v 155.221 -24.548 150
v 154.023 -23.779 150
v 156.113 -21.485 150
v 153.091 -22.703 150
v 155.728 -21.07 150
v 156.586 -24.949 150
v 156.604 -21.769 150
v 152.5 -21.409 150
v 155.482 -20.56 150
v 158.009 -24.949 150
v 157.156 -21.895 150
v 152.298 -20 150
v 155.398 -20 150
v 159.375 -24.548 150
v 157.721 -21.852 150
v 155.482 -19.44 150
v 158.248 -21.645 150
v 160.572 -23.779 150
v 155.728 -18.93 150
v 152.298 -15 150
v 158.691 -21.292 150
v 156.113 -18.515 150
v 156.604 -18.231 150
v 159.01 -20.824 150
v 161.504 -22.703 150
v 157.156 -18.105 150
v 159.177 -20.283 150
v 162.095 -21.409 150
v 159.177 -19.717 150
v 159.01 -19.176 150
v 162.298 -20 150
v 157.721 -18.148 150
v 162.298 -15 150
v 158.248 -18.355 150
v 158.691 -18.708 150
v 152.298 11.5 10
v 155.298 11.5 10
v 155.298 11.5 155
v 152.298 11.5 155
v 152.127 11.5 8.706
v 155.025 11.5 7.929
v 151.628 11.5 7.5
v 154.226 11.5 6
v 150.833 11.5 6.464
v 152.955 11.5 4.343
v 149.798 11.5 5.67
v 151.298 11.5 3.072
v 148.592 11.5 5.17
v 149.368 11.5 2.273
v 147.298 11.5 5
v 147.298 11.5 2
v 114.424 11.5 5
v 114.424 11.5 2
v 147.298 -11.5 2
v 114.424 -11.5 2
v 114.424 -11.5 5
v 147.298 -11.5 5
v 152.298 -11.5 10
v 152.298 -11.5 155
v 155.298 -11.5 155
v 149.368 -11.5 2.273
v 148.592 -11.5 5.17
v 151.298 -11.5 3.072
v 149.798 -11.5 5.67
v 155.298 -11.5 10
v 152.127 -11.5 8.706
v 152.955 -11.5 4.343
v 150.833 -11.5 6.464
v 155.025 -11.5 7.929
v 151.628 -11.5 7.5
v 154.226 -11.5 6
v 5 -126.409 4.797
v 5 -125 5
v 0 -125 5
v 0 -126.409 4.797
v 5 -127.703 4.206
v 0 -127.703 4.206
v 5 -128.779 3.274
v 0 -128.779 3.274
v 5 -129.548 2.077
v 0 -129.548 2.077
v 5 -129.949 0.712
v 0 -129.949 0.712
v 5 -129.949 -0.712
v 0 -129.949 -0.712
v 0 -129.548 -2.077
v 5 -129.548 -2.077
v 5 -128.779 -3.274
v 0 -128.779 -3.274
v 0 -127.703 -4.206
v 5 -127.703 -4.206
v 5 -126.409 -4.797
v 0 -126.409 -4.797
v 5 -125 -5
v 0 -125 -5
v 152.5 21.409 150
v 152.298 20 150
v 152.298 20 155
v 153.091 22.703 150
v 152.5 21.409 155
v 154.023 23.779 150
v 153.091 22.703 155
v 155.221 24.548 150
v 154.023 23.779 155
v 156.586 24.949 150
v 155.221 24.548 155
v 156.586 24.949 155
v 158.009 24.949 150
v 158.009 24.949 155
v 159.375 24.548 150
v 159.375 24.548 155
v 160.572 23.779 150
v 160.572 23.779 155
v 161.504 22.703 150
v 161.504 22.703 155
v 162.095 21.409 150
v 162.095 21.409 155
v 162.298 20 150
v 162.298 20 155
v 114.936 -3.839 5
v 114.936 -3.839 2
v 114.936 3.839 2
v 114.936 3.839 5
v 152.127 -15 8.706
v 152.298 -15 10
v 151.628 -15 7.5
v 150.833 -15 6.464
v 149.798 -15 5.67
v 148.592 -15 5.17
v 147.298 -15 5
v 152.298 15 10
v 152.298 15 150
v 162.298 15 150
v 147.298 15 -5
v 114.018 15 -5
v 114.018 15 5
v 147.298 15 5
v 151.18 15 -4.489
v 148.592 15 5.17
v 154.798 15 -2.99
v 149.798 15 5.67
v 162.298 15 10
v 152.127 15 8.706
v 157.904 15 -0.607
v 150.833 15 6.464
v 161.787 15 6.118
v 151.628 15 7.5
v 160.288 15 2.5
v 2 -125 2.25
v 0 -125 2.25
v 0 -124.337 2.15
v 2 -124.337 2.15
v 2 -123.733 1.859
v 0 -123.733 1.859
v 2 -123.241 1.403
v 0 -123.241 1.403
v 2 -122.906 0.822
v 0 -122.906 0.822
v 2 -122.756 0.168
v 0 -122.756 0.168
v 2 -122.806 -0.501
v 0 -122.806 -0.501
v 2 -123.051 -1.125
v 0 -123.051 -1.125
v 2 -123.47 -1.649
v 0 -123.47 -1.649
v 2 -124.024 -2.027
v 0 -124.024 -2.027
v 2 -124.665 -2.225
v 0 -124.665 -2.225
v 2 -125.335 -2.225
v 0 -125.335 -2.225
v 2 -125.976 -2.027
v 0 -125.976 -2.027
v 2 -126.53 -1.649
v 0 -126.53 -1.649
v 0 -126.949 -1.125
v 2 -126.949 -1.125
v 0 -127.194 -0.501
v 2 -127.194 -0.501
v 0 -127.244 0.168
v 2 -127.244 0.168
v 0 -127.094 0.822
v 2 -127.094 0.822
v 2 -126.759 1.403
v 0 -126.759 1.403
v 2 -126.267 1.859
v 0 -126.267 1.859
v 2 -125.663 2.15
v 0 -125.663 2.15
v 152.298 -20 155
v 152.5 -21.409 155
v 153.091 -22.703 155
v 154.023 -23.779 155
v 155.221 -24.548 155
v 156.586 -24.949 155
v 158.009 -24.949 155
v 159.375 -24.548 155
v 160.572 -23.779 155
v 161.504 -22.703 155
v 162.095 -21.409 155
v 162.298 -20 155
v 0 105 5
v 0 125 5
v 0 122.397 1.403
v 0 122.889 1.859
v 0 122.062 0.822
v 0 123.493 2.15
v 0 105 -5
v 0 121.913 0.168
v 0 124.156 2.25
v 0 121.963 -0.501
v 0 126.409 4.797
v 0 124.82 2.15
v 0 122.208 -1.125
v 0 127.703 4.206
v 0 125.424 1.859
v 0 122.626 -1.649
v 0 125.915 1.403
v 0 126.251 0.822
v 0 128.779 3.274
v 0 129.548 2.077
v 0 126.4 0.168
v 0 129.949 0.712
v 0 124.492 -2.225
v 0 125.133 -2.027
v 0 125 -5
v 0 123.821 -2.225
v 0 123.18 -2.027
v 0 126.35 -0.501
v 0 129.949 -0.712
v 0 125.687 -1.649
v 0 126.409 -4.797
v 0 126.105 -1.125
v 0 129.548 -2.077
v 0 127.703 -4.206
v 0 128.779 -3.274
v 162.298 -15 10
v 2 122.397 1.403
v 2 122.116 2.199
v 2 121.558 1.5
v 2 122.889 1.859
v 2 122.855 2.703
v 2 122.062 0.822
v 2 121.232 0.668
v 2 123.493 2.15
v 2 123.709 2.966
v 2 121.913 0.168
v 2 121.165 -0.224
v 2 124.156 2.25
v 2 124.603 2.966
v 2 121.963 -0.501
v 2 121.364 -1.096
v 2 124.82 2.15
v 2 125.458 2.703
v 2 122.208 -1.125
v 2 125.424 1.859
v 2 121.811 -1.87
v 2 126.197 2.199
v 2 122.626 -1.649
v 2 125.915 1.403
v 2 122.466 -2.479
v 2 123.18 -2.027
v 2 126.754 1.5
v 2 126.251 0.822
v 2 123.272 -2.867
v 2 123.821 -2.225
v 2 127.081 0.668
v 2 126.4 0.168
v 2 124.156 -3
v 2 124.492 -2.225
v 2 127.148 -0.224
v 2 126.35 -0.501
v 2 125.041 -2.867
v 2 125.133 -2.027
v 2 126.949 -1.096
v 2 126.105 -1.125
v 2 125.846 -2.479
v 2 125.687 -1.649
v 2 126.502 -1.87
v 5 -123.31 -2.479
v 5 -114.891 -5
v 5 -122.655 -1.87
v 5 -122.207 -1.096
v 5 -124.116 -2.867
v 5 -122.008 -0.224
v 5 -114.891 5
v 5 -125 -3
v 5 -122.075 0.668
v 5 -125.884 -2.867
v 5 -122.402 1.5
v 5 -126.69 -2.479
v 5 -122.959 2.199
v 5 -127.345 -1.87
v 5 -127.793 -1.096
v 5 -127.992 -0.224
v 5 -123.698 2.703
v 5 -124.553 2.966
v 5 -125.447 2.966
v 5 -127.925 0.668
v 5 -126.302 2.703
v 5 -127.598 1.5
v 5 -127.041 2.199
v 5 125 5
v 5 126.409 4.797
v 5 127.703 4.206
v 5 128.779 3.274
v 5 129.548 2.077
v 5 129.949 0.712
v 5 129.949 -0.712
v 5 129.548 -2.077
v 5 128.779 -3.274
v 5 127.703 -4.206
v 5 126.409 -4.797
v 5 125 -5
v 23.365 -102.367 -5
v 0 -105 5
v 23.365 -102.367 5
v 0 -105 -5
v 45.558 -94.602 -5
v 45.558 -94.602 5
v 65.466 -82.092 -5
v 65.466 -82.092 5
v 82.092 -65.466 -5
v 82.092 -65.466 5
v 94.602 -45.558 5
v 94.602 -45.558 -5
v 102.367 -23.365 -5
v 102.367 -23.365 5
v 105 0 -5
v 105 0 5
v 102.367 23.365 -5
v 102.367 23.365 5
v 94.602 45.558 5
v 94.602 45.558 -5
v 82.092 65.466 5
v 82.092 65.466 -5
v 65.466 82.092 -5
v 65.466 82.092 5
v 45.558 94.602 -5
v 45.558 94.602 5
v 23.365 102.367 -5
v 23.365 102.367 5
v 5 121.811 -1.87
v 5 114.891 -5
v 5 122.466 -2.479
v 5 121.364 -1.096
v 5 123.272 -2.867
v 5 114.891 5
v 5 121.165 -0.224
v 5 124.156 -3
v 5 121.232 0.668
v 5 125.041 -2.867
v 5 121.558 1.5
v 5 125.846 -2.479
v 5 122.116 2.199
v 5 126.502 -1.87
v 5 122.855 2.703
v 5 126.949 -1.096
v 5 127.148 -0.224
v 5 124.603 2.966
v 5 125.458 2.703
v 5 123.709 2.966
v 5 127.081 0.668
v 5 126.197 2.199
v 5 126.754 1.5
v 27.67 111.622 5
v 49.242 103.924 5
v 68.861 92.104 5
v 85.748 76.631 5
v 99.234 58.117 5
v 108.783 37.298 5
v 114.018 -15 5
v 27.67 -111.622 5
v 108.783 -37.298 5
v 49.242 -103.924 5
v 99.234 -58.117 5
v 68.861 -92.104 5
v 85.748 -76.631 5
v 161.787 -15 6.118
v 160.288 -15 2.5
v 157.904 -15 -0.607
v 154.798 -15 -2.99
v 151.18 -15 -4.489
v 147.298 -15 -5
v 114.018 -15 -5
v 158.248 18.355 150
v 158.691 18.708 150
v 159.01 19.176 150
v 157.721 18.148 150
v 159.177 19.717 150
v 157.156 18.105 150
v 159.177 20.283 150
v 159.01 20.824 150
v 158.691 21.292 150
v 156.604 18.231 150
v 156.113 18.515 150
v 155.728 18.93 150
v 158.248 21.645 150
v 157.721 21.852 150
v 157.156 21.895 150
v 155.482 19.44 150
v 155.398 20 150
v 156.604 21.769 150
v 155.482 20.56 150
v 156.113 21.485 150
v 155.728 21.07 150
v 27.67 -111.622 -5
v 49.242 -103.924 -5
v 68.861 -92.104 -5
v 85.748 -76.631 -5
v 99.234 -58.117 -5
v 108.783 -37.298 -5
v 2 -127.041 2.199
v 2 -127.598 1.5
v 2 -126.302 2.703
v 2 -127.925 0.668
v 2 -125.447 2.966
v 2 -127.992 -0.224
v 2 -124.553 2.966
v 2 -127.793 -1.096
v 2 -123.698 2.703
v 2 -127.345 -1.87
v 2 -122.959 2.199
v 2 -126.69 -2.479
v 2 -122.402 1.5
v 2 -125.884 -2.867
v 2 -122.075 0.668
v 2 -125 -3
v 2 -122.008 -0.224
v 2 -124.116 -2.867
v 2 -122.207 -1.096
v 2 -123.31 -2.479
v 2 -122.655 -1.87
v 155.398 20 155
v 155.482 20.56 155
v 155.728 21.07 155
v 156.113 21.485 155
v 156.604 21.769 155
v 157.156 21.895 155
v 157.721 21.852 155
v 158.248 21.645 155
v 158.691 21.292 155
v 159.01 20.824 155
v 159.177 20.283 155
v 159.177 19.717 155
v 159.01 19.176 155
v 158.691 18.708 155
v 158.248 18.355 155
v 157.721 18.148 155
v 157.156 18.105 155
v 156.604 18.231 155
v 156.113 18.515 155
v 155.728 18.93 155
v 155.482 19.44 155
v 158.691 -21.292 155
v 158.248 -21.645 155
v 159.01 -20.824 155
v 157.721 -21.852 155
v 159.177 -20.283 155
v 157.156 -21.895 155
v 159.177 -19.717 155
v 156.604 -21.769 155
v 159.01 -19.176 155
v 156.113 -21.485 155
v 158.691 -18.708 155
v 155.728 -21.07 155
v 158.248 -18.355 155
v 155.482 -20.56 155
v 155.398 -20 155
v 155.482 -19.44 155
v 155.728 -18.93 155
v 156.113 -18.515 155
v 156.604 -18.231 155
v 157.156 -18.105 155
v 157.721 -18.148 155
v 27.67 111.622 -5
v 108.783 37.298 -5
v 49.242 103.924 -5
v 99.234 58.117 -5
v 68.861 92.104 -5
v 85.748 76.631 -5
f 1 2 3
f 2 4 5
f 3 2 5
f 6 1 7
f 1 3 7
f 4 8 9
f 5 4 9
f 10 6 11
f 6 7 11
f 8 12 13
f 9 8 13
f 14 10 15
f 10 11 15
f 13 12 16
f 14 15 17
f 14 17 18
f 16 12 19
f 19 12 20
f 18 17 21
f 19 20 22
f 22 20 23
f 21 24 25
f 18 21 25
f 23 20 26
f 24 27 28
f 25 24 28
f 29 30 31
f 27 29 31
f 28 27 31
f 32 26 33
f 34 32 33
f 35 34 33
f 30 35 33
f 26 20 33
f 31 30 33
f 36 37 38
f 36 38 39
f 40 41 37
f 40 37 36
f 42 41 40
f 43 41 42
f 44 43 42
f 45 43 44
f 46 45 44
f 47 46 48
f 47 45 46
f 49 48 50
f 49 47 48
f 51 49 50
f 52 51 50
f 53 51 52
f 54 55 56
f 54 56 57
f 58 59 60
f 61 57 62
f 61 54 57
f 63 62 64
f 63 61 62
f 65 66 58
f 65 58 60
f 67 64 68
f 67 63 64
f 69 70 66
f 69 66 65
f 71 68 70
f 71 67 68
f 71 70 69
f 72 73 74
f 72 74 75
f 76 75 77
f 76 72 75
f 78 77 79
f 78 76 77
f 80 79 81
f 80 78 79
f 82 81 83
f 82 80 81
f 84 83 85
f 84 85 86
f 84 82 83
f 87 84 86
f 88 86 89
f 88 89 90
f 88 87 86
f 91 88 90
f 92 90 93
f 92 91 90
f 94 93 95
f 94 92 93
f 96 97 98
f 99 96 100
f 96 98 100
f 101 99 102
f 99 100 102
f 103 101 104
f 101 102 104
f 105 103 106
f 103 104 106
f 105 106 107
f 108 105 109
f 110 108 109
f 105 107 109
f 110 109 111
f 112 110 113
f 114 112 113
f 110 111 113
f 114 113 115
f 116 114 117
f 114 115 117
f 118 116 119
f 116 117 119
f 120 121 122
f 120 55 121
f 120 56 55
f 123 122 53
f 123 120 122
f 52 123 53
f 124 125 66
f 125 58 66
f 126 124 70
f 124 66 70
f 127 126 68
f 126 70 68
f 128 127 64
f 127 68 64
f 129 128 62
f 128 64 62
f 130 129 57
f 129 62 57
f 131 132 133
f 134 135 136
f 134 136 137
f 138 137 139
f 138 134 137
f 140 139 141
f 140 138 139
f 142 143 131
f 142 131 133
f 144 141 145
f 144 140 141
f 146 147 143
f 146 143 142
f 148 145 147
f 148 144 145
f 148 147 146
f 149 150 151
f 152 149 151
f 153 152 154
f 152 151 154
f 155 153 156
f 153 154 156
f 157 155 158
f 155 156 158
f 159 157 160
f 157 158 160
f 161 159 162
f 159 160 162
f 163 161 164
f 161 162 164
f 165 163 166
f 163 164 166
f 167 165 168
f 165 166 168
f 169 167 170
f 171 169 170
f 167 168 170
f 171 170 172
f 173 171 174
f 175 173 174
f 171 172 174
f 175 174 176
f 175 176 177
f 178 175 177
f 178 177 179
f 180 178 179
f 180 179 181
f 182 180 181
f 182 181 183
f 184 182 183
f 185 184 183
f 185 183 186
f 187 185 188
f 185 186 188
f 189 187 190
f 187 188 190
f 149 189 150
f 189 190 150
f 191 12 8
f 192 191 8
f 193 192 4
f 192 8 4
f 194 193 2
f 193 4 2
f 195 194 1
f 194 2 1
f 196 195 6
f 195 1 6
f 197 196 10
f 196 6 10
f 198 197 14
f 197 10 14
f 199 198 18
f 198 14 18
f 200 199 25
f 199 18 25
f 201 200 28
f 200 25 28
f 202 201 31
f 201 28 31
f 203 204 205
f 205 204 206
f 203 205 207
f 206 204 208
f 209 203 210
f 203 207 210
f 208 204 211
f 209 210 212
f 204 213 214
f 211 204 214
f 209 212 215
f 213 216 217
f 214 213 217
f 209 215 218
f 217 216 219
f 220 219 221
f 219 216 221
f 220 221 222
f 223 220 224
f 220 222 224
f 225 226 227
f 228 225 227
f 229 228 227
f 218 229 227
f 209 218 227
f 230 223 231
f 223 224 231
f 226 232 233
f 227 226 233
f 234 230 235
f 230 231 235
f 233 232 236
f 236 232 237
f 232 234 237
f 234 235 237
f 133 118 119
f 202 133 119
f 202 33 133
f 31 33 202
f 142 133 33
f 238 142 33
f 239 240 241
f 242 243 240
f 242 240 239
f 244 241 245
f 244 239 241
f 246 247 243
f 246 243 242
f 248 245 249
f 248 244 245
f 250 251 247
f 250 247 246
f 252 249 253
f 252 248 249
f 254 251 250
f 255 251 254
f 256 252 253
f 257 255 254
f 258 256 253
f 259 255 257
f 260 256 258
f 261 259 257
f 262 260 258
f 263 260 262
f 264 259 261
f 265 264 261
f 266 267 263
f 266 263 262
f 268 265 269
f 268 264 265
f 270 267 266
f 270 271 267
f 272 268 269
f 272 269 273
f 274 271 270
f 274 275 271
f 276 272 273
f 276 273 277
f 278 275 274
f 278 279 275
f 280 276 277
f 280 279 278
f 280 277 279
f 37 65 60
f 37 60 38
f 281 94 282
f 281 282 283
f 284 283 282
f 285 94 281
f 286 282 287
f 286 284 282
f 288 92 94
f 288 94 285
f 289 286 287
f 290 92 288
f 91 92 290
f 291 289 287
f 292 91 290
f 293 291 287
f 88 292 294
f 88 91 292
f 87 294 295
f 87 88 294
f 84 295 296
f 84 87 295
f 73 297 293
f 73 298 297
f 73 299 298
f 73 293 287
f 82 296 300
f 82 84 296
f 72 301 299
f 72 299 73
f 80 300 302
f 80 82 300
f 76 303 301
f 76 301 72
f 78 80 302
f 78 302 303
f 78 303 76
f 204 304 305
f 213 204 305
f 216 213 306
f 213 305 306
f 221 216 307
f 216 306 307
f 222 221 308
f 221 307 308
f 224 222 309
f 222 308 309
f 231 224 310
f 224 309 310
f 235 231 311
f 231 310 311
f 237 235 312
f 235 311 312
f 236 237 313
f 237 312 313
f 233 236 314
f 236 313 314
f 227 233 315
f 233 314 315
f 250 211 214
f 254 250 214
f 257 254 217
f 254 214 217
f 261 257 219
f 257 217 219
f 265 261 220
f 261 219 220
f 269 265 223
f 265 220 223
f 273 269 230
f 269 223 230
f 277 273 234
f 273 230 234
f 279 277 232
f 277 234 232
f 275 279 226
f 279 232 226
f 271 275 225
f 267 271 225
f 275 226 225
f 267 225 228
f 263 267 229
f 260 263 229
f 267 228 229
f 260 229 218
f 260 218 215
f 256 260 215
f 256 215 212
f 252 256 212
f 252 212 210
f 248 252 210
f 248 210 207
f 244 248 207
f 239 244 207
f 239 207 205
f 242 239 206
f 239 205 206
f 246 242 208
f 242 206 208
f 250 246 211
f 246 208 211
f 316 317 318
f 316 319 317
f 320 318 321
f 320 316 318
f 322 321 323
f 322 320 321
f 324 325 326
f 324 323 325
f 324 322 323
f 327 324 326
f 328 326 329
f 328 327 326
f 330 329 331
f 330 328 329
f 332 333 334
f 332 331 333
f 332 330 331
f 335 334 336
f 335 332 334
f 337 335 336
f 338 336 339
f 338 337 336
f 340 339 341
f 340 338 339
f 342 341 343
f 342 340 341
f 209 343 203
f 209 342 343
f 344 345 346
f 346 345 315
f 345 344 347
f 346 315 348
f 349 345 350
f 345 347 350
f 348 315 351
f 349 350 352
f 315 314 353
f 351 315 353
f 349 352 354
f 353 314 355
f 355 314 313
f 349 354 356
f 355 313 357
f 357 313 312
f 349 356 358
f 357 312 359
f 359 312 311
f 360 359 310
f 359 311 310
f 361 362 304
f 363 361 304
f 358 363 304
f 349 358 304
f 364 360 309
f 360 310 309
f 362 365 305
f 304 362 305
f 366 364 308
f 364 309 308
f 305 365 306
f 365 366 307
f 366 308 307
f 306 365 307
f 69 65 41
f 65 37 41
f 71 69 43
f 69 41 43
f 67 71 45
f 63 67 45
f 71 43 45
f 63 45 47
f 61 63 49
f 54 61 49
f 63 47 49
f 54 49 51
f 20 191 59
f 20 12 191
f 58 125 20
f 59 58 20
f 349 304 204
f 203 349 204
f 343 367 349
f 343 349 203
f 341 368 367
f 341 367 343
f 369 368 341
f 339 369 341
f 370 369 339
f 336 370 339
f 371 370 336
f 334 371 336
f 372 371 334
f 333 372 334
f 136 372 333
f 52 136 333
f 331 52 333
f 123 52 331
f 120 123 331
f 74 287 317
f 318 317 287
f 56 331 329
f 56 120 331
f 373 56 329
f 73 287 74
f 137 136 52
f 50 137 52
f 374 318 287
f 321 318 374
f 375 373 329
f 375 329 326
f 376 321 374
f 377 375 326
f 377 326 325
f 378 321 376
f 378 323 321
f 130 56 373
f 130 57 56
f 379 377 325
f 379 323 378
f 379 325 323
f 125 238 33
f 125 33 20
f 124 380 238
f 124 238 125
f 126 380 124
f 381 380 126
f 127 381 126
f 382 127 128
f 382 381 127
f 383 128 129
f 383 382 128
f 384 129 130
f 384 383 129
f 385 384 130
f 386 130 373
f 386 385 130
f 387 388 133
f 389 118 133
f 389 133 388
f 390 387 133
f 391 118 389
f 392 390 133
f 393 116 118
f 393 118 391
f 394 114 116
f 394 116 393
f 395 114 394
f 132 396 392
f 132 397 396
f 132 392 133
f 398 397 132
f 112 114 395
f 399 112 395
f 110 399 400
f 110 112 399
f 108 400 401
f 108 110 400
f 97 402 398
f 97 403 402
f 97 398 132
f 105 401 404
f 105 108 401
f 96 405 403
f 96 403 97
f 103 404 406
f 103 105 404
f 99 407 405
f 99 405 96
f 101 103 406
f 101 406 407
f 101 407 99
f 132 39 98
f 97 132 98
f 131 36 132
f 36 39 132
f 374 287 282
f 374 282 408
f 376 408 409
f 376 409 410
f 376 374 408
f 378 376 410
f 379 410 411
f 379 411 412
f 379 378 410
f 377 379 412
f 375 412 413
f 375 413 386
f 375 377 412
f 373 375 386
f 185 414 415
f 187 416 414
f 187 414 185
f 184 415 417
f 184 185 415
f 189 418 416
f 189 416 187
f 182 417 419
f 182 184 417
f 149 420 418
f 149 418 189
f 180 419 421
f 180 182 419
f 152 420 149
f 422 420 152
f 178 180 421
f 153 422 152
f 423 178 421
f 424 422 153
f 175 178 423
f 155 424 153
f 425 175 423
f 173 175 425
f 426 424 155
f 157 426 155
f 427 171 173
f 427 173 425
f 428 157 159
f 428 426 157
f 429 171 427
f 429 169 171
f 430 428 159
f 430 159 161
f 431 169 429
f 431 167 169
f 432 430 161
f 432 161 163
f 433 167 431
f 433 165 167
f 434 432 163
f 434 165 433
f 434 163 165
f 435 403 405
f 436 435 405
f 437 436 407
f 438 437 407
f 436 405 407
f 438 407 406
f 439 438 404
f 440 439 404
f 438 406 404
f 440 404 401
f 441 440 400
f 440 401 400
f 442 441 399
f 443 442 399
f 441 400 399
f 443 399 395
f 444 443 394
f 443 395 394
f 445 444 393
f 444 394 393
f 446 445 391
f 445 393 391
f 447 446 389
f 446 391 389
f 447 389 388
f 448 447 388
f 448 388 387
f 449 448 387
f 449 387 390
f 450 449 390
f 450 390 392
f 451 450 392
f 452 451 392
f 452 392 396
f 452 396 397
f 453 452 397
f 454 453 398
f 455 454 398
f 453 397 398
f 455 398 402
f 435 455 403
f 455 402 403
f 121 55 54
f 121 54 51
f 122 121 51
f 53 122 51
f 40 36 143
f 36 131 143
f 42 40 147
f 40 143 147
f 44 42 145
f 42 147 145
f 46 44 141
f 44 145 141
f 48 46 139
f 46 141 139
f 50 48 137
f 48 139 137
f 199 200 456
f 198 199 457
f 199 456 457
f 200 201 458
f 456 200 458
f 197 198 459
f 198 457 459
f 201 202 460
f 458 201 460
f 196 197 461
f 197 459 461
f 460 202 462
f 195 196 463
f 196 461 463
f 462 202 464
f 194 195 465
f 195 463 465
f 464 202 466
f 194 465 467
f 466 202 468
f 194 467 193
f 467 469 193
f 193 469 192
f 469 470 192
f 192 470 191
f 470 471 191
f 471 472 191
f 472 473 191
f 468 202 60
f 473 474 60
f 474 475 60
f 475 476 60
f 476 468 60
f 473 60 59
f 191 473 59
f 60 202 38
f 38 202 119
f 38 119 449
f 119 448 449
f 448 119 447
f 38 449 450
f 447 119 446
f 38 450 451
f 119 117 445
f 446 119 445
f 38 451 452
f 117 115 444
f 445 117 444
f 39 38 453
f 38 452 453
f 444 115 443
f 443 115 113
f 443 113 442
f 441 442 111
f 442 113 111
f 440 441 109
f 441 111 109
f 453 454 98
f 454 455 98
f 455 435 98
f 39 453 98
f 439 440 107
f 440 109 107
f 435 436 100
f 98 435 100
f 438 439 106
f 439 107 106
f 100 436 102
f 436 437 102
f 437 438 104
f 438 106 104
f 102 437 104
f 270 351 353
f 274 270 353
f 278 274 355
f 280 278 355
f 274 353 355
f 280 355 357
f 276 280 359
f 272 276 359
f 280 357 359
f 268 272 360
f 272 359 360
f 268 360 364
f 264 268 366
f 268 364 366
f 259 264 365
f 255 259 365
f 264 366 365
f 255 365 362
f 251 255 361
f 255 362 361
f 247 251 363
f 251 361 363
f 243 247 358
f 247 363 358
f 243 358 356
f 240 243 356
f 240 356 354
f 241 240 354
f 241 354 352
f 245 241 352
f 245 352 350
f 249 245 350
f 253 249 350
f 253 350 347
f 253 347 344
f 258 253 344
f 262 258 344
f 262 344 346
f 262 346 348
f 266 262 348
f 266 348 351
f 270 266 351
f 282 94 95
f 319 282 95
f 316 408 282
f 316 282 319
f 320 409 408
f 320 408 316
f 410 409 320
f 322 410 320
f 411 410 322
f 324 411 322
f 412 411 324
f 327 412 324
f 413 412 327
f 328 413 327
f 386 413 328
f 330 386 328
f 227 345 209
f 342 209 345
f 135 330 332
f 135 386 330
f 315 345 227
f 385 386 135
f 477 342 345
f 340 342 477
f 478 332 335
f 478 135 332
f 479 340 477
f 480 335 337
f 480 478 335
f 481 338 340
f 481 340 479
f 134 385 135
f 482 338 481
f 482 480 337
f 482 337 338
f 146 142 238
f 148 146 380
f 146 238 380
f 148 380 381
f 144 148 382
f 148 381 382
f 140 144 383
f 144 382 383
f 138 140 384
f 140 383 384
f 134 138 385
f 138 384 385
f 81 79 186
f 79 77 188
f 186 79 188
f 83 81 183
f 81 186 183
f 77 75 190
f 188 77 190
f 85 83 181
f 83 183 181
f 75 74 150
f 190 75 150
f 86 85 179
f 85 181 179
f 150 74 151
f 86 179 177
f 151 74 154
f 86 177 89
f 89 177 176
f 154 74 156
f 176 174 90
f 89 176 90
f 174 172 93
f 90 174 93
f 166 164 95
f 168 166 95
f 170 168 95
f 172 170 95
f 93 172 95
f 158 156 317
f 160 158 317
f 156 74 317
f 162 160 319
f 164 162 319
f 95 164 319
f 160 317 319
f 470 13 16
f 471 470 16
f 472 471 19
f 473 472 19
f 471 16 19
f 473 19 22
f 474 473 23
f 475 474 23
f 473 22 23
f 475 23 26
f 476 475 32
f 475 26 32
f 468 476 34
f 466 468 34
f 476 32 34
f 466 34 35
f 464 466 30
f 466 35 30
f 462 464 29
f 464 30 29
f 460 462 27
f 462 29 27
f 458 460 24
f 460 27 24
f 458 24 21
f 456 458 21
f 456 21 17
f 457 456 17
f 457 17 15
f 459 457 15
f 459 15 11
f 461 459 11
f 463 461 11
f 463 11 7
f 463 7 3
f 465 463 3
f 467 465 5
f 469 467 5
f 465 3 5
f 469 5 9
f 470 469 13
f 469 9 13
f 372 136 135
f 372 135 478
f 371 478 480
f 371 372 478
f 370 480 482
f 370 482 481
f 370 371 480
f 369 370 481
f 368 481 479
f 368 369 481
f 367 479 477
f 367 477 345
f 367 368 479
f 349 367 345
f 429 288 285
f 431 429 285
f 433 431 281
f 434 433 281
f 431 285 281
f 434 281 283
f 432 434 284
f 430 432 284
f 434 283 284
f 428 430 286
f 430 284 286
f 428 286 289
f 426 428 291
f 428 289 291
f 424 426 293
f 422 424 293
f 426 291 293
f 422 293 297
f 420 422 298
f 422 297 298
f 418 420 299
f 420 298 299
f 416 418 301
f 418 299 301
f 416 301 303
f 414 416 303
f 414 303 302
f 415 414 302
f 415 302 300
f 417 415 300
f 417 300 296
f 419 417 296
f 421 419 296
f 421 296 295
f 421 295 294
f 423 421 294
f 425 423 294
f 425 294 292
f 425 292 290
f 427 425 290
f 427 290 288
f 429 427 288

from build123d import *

# Parameters (mm, degrees)
SKETCH_1_R                = 115
SKETCH_1_R_2              = 105
EXTRUDE_1_DEPTH           = 5
SKETCH_4_R                = 2.5
CUT_EXTRUDE_1_DEPTH       = 33.934862746
EXTRUDE_2_DEPTH           = 5
HOLE_WIZARD_1_D           = 4.5
HOLE_WIZARD_1_CBORE_D     = 6
HOLE_WIZARD_1_CBORE_DEPTH = 3
SKETCH_9_R                = 2.25
SKETCH_9_R_2              = 1.9
EXTRUDE_3_DEPTH           = 5
EXTRUDE_4_DEPTH           = 5
HOLE_WIZARD_2_D           = 4.5
HOLE_WIZARD_2_CBORE_D     = 6
HOLE_WIZARD_2_CBORE_DEPTH = 3
SKETCH_13_R               = 2.25
SKETCH_13_R_2             = 1.9
EXTRUDE_5_DEPTH           = 5
SKETCH_14_W               = 562.038590931
SKETCH_14_H               = 462.09177453
CUT_EXTRUDE_4_DEPTH       = 163.29776757
SKETCH_15_W               = 637.223239982
SKETCH_15_H               = 375.31186697
CUT_EXTRUDE_5_DEPTH       = 202.710100717


with BuildPart() as part:
    # 草图1 → 凸台-拉伸1 (new body, symmetric)
    with BuildSketch(Plane.XY):
        Circle(SKETCH_1_R)
        Circle(SKETCH_1_R_2, mode=Mode.SUBTRACT)
    extrude(amount=EXTRUDE_1_DEPTH, both=True)

    # 扫描1: sweep along a path in 草图2
    with BuildLine(Plane(origin=(0, 0, 0), x_dir=(1, 0, 0), z_dir=(0, 1, 0))) as sweep_1_path:
        Line((-130, -355), (-156.694693778, -281.656931626))
        ThreePointArc((-156.694693778, -281.656931626), (-157.1458451, -279.97321197), (-157.29776757, -278.236730193))
        Line((-157.29776757, -278.236730193), (-157.29776757, -10))
        ThreePointArc((-157.29776757, -10), (-154.368835382, -2.928932188), (-147.29776757, 0))
        Line((-147.29776757, 0), (-115, 0))
        Line((-115, 0), (-106.681302201, 0))
    # 草图3 → 扫描1 (sweep)
    with BuildSketch(Plane(origin=(-130, 0, 355), x_dir=(0.939692621, 0, -0.342020143), z_dir=(0.342020143, 0, 0.939692621))):
        Polygon((-5, -15), (5, -15), (5, -11.5), (2, -11.5), (2, 11.5), (5, 11.5), (5, 15), (-5, 15), align=None)
    sweep_1 = sweep(path=sweep_1_path.line)

    # 草图4 → 切除-拉伸1 (cut, through all)
    with BuildSketch(Plane(origin=(-227.008304281, 0, 82.624265689), x_dir=(-0.342020143, 0, -0.939692621), z_dir=(0.939692621, 0, -0.342020143))):
        with Locations((-274.128261747, 6.75)):
            Circle(SKETCH_4_R)
        with Locations((-274.128261747, -6.75)):
            Circle(SKETCH_4_R)
    cut_extrude_1 = extrude(amount=-CUT_EXTRUDE_1_DEPTH, mode=Mode.SUBTRACT)

    # 镜向1: 扫描1, 切除-拉伸1 across plane
    add(sweep_1.mirror(Plane(origin=(0, 0, 0), x_dir=(0, 0, 1), z_dir=(1, 0, 0))))
    add(cut_extrude_1.mirror(Plane(origin=(0, 0, 0), x_dir=(0, 0, 1), z_dir=(1, 0, 0))), mode=Mode.SUBTRACT)

    # 草图6 → 凸台-拉伸2 (add, symmetric)
    with BuildSketch(Plane(origin=(0, 0, 0), x_dir=(0, 0, -1), z_dir=(1, 0, 0))):
        with BuildLine():
            Line((-5, 115), (-5, 125))
            ThreePointArc((-5, 125), (0, 130), (5, 125))
            Line((5, 125), (5, 115))
            Line((5, 115), (5, 112.136445143))
            Line((5, 112.136445143), (-5, 112.136445143))
            Line((-5, 112.136445143), (-5, 115))
        make_face()
    extrude_2 = extrude(amount=EXTRUDE_2_DEPTH, both=True)

    # 镜向2: 凸台-拉伸2 across plane
    add(extrude_2.mirror(Plane.ZX))

    # 孔1 (through all)
    with Locations(Plane(origin=(5, 0, 0), x_dir=(0, 0, -1), z_dir=(1, 0, 0))):
        with Locations((0, 124.156343107), (0, -125)):
            CounterBoreHole(HOLE_WIZARD_1_D / 2, HOLE_WIZARD_1_CBORE_D / 2, HOLE_WIZARD_1_CBORE_DEPTH)

    # 草图9 → 凸台-拉伸3 (add)
    with BuildSketch(Plane.ZY.offset(5)):
        with Locations((0, 124.156343107)):
            Circle(SKETCH_9_R)
        with Locations((0, 124.156343107)):
            Circle(SKETCH_9_R_2, mode=Mode.SUBTRACT)
        with Locations((0, -125)):
            Circle(SKETCH_9_R)
        with Locations((0, -125)):
            Circle(SKETCH_9_R_2, mode=Mode.SUBTRACT)
    extrude(amount=-EXTRUDE_3_DEPTH)

    # 草图10 → 凸台-拉伸4 (add, symmetric)
    with BuildSketch(Plane.XY.offset(155)):
        with BuildLine():
            Line((-162.29776757, 15), (-152.29776757, 15))
            Line((-152.29776757, 15), (-152.29776757, 20))
            ThreePointArc((-152.29776757, 20), (-157.29776757, 25), (-162.29776757, 20))
            Line((-162.29776757, 20), (-162.29776757, 15))
        make_face()
        with BuildLine():
            Line((-152.29776757, -15), (-152.29776757, -20))
            ThreePointArc((-152.29776757, -20), (-157.29776757, -25), (-162.29776757, -20))
            Line((-162.29776757, -20), (-162.29776757, -15))
            Line((-162.29776757, -15), (-152.29776757, -15))
        make_face()
        with BuildLine():
            Line((162.29776757, -15), (152.29776757, -15))
            Line((152.29776757, -15), (152.29776757, -20))
            ThreePointArc((152.29776757, -20), (157.29776757, -25), (162.29776757, -20))
            Line((162.29776757, -20), (162.29776757, -15))
        make_face()
        with BuildLine():
            Line((152.29776757, 15), (152.29776757, 20))
            ThreePointArc((152.29776757, 20), (157.29776757, 25), (162.29776757, 20))
            Line((162.29776757, 20), (162.29776757, 15))
            Line((162.29776757, 15), (152.29776757, 15))
        make_face()
    extrude(amount=EXTRUDE_4_DEPTH, both=True)

    # 孔2 (through all)
    with Locations(Plane.XY.offset(160)):
        with Locations((-157.29776757, 20), (-157.29776757, -20), (157.29776757, 20), (157.29776757, -20)):
            CounterBoreHole(HOLE_WIZARD_2_D / 2, HOLE_WIZARD_2_CBORE_D / 2, HOLE_WIZARD_2_CBORE_DEPTH)

    # 草图13 → 凸台-拉伸5 (add)
    with BuildSketch(Plane(origin=(0, 0, 150), x_dir=(-1, 0, 0), z_dir=(0, 0, -1))):
        with Locations((-157.29776757, 20)):
            Circle(SKETCH_13_R)
        with Locations((-157.29776757, 20)):
            Circle(SKETCH_13_R_2, mode=Mode.SUBTRACT)
        with Locations((-157.29776757, -20)):
            Circle(SKETCH_13_R)
        with Locations((-157.29776757, -20)):
            Circle(SKETCH_13_R_2, mode=Mode.SUBTRACT)
        with Locations((157.29776757, -20)):
            Circle(SKETCH_13_R)
        with Locations((157.29776757, -20)):
            Circle(SKETCH_13_R_2, mode=Mode.SUBTRACT)
        with Locations((157.29776757, 20)):
            Circle(SKETCH_13_R)
        with Locations((157.29776757, 20)):
            Circle(SKETCH_13_R_2, mode=Mode.SUBTRACT)
    extrude(amount=-EXTRUDE_5_DEPTH)

    # 草图14 → 切除-拉伸4 (cut, through all)
    with BuildSketch(Plane(origin=(0, 0, 0), x_dir=(0, 0, -1), z_dir=(1, 0, 0))):
        with Locations((-153.139864812, -31.152254463)):
            Rectangle(SKETCH_14_W, SKETCH_14_H)
    extrude(amount=-CUT_EXTRUDE_4_DEPTH, mode=Mode.SUBTRACT)

    # 草图15 → 切除-拉伸5 (cut, through all)
    with BuildSketch(Plane.XY.offset(155)):
        Rectangle(SKETCH_15_W, SKETCH_15_H)
    extrude(amount=CUT_EXTRUDE_5_DEPTH, mode=Mode.SUBTRACT)


solid = part.part
